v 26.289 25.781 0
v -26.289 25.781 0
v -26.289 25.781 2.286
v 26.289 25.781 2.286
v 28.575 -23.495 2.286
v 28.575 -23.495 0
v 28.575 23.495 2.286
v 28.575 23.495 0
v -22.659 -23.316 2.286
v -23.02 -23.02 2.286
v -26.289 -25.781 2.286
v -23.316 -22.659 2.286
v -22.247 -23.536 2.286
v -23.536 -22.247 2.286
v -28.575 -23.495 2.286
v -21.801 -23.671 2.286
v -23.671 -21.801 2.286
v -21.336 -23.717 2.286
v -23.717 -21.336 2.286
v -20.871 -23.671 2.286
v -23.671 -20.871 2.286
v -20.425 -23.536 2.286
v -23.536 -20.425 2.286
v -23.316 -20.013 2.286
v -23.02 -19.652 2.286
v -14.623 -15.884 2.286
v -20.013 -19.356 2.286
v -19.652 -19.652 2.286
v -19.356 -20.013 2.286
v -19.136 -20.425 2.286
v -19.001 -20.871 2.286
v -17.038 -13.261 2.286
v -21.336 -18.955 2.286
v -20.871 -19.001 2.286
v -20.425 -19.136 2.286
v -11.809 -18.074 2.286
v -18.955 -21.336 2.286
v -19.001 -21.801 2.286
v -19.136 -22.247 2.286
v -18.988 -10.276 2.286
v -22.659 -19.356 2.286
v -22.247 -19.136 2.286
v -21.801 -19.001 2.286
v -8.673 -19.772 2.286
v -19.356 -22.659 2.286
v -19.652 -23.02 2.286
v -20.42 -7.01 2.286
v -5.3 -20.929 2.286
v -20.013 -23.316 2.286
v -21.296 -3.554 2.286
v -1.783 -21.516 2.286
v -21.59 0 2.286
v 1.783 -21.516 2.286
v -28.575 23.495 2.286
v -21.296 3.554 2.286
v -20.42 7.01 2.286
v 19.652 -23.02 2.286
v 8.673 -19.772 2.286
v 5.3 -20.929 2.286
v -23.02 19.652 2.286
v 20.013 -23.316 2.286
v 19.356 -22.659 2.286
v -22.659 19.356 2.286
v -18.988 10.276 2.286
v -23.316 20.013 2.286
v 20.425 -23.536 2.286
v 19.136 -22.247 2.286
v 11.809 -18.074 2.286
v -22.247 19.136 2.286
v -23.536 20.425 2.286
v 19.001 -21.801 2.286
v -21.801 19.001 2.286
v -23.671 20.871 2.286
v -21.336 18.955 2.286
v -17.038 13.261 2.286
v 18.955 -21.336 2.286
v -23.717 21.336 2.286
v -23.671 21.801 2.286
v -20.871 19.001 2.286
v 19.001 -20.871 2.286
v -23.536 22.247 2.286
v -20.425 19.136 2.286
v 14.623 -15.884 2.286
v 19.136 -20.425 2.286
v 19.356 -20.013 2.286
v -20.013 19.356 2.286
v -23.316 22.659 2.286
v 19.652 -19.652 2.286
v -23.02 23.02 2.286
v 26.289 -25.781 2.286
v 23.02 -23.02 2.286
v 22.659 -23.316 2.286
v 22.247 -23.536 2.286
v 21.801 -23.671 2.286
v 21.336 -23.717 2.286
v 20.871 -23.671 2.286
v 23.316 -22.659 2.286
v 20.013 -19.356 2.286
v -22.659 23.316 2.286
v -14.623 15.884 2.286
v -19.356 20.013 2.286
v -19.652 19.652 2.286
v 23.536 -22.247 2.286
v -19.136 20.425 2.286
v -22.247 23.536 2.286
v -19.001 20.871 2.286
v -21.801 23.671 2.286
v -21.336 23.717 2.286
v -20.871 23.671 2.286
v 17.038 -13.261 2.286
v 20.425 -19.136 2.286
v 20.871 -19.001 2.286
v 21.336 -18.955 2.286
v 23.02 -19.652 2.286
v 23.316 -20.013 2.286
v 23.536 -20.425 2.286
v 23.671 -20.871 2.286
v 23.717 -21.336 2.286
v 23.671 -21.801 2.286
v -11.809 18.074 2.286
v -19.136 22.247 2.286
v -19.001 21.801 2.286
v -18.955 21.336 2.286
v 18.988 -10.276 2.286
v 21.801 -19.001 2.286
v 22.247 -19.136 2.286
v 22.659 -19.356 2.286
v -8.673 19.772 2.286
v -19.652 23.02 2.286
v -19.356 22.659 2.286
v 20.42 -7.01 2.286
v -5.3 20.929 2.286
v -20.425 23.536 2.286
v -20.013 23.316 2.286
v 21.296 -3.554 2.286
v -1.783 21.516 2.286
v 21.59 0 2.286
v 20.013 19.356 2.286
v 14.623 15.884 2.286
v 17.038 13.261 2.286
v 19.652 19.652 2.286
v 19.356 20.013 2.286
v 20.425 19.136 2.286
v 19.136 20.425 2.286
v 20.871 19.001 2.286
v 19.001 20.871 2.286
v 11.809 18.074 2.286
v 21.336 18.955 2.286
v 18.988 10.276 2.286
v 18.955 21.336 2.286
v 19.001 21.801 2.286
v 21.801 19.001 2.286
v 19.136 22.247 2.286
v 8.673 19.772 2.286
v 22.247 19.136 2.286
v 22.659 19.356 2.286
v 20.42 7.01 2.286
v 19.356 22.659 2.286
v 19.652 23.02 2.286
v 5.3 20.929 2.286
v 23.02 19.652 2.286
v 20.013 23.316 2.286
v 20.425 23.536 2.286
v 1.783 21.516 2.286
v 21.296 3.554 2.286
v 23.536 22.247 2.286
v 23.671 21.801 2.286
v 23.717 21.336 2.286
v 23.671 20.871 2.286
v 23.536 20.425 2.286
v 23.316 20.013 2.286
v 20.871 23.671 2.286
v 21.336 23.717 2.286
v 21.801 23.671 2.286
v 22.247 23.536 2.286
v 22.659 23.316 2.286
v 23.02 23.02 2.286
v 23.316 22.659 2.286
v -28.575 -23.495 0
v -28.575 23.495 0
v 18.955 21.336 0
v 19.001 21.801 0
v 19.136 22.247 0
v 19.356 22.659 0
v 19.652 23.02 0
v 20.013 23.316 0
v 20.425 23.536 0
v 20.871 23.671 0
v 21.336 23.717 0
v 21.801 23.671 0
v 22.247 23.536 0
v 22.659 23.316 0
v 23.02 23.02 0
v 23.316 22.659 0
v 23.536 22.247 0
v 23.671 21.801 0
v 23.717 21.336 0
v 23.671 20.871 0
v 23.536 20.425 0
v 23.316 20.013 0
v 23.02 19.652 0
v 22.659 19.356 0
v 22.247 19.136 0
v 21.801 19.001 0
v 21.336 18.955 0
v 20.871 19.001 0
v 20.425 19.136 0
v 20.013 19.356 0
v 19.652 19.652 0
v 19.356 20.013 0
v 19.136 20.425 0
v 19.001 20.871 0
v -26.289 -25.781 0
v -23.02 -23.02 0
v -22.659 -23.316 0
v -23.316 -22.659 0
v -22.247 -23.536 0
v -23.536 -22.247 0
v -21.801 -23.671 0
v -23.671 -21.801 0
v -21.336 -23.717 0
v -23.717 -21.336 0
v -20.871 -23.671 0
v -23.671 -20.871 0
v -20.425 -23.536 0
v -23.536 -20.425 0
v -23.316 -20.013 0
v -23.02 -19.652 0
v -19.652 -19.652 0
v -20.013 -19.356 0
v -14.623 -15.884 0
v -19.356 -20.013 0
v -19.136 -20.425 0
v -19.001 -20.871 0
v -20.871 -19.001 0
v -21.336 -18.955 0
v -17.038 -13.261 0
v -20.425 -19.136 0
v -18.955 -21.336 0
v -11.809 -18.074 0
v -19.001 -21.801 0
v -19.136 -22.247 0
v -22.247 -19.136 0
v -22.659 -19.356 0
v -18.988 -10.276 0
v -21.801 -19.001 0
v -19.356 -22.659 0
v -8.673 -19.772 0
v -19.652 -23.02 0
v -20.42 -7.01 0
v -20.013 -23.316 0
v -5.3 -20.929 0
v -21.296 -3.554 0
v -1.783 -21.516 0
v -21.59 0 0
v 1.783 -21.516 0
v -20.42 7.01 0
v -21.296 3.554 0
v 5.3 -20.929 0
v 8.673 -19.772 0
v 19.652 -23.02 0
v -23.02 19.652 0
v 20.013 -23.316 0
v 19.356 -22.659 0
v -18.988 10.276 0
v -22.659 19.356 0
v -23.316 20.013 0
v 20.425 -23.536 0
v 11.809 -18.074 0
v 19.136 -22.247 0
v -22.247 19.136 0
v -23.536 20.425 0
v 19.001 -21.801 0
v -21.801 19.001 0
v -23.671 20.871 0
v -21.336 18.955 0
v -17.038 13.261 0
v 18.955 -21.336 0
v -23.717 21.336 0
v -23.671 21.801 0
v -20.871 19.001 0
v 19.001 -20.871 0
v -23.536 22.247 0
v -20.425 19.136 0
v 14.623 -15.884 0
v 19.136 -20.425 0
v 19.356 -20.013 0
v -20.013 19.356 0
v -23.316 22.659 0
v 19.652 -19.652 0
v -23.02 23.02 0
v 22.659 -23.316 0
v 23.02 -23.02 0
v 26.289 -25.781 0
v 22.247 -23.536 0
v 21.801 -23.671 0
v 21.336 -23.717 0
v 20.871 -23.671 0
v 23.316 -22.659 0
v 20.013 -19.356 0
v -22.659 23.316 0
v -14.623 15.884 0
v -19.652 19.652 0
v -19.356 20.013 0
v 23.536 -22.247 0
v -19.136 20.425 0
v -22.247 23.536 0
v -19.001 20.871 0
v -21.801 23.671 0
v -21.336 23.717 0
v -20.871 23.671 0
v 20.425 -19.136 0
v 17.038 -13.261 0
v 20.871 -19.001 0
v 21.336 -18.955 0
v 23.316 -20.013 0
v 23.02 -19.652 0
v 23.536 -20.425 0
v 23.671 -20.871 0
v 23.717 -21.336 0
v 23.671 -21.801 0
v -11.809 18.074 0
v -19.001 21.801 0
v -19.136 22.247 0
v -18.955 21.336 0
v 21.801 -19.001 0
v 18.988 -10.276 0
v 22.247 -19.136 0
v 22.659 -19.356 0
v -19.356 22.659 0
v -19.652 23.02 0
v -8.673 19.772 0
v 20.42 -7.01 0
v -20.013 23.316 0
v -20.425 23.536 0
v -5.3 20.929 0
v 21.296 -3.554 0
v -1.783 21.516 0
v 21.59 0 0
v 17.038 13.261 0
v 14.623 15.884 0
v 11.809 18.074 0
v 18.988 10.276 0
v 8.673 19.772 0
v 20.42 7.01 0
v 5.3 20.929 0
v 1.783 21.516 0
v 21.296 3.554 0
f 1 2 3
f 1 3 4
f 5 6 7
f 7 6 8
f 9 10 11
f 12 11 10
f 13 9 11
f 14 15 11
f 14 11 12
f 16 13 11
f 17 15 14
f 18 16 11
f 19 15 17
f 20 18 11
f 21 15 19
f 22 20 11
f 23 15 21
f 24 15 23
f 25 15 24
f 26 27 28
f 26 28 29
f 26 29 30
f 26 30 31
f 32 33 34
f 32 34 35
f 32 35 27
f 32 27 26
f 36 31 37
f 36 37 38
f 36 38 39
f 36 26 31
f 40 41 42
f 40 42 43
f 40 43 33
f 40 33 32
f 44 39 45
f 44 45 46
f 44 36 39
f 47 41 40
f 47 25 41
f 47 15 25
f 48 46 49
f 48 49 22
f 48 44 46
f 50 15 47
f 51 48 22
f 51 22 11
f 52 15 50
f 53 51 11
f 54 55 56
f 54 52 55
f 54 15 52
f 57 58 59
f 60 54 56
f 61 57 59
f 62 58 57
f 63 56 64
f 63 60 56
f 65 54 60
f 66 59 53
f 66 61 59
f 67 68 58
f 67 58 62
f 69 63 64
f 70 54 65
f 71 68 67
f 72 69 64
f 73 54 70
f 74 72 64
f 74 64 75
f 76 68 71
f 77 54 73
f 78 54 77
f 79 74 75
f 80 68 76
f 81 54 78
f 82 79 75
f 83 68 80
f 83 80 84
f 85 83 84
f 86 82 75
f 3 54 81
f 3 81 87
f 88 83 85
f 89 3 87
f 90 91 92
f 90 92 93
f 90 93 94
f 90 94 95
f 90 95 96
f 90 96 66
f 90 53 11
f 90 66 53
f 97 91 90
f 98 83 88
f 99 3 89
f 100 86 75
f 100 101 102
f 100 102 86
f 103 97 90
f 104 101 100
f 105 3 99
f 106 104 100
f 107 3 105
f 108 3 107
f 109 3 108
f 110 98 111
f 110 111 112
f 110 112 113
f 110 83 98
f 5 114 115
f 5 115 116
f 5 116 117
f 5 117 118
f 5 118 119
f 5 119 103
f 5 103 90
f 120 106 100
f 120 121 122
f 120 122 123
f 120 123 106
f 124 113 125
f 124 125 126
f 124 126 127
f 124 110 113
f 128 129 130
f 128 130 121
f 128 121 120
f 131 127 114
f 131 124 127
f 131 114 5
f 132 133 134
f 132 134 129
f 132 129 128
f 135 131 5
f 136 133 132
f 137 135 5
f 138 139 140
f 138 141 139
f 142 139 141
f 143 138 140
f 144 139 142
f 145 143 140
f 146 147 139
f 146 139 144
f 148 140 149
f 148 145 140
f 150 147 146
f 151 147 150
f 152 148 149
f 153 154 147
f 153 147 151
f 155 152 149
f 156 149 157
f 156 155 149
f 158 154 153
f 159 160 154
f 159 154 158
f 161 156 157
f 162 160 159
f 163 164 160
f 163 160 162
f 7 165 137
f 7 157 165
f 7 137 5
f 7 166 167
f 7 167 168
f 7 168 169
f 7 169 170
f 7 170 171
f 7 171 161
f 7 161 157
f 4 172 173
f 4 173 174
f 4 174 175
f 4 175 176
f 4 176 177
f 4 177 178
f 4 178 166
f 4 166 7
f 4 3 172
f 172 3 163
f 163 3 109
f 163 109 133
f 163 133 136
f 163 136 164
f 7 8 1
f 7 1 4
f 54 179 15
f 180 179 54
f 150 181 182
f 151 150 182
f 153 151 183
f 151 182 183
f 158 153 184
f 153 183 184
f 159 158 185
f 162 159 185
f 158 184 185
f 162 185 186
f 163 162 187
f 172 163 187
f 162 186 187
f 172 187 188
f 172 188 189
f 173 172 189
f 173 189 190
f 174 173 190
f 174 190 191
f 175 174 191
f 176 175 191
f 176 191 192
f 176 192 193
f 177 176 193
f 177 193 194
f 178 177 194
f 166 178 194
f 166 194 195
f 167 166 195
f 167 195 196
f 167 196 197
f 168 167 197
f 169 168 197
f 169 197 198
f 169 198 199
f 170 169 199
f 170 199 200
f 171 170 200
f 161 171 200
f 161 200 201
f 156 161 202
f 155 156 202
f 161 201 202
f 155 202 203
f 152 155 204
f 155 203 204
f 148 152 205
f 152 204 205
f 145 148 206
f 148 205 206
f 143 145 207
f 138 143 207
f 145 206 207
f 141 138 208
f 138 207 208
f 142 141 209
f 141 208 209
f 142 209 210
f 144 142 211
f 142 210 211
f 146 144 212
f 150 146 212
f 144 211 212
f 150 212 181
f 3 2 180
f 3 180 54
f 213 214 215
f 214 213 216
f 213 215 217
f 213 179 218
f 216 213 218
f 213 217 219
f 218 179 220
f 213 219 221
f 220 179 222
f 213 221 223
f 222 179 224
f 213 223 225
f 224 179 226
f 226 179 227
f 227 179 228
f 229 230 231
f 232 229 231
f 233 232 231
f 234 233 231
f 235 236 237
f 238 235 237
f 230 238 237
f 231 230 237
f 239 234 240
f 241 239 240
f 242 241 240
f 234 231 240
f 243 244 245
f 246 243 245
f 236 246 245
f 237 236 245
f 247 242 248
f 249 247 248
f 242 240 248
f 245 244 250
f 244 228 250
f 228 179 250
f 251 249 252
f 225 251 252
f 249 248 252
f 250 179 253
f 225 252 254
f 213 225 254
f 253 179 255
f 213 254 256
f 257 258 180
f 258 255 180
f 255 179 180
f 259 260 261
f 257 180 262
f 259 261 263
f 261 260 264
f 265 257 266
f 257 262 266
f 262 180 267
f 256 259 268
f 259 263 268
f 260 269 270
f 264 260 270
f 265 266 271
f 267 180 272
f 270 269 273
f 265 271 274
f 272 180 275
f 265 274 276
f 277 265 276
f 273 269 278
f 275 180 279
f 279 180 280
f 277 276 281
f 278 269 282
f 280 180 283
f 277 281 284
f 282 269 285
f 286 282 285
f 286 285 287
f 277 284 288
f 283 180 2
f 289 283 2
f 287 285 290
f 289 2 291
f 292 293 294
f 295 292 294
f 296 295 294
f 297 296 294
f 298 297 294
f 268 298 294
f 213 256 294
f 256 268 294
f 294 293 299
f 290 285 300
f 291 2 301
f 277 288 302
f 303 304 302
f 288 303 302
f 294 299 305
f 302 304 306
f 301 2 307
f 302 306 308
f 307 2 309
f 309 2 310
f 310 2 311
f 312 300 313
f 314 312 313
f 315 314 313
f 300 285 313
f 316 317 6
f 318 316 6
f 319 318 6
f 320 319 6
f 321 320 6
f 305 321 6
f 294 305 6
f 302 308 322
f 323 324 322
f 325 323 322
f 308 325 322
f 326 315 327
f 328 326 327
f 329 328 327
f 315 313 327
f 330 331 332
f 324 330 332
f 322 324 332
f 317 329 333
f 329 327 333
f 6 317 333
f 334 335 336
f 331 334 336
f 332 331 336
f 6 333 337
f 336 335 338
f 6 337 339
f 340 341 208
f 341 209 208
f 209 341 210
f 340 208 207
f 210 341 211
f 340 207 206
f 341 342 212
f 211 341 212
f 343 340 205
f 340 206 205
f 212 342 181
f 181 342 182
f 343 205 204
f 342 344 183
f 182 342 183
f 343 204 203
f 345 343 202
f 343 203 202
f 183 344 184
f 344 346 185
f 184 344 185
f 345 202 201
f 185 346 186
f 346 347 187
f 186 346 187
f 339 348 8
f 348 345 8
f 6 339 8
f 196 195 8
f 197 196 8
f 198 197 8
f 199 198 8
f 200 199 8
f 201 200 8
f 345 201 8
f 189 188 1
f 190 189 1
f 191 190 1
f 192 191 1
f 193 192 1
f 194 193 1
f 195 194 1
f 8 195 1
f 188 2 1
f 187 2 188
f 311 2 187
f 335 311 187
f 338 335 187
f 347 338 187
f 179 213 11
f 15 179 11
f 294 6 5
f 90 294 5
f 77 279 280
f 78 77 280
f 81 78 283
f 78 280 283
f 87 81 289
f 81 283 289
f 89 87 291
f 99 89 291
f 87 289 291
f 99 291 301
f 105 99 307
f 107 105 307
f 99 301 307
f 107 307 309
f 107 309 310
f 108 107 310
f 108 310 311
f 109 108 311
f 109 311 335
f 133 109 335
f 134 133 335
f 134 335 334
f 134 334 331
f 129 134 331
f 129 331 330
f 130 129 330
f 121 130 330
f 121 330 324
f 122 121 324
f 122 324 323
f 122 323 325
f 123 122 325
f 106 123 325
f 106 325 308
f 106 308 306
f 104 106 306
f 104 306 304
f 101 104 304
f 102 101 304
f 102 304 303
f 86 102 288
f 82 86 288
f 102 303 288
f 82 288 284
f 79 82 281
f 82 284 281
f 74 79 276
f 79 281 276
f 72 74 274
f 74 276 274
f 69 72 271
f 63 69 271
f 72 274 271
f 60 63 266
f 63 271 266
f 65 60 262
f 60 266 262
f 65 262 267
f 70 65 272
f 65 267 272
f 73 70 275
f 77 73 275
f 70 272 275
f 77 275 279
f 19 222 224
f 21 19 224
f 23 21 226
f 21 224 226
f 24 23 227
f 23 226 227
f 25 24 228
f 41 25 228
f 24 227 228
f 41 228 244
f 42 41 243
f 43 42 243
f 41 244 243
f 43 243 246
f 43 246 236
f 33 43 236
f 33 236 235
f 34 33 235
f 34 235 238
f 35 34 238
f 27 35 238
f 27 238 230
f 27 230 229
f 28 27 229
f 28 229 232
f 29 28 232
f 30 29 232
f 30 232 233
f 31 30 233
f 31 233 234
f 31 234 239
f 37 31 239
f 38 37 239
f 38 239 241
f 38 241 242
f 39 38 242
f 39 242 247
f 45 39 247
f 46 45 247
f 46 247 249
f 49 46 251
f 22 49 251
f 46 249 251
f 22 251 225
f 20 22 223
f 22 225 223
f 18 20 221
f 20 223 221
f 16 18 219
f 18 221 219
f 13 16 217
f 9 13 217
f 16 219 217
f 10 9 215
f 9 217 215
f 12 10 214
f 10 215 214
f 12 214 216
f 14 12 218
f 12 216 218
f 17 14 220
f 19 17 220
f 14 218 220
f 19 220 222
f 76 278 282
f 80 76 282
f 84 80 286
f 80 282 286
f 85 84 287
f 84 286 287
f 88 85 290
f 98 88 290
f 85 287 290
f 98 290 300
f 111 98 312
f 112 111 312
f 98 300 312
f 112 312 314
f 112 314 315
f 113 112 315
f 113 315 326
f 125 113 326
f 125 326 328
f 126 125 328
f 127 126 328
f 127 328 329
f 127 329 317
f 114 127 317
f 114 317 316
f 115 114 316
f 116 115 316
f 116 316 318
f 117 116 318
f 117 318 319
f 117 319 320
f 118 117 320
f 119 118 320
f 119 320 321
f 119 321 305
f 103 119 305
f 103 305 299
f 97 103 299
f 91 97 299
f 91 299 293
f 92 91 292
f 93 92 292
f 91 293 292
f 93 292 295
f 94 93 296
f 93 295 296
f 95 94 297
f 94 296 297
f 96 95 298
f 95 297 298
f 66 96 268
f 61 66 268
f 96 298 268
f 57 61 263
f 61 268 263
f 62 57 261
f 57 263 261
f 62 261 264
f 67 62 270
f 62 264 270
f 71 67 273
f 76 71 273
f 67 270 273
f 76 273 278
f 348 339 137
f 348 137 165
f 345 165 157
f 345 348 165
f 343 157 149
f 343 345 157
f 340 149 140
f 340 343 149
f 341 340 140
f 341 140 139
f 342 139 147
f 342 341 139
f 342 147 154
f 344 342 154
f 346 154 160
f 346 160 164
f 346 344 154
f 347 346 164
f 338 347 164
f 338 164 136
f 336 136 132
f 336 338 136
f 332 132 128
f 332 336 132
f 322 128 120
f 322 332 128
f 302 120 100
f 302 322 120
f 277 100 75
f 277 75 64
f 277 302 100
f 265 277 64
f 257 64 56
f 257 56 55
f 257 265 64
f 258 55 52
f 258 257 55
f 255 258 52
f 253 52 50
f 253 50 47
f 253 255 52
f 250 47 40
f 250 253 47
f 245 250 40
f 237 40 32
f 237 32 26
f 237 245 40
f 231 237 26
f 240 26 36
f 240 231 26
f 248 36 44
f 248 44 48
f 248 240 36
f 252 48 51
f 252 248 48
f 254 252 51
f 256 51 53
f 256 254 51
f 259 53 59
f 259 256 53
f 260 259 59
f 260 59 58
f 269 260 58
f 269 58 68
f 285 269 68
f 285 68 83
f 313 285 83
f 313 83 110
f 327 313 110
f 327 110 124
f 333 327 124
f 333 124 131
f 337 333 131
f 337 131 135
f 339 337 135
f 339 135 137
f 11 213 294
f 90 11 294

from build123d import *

# Parameters (mm, degrees)
SKETCH1_W                      = 57.15
SKETCH1_H                      = 51.562
SKETCH1_R                      = 21.59
BOSS_EXTRUDE1_DEPTH            = 2.286
F_3_16_0_1875_DIAMETER_HOLE1_D = 4.7625
CHAMFER1_SIZE                  = 2.286


with BuildPart() as part:
    # Sketch1 → Boss-Extrude1 (new body)
    with BuildSketch(Plane.XY):
        Rectangle(SKETCH1_W, SKETCH1_H)
        Circle(SKETCH1_R, mode=Mode.SUBTRACT)
    extrude(amount=BOSS_EXTRUDE1_DEPTH)

    # 3/16 (0.1875) Diameter Hole1 (through all)
    with Locations(Plane.XY.offset(2.286)):
        with Locations((21.336, 21.336), (-21.336, 21.336), (-21.336, -21.336), (21.336, -21.336)):
            Hole(F_3_16_0_1875_DIAMETER_HOLE1_D / 2)

    # Chamfer1
    chamfer1_edges = [part.edges().sort_by_distance(p)[0] for p in [
        (-28.575, 25.781, 1.143),
        (28.575, 25.781, 1.143),
        (28.575, -25.781, 1.143),
        (-28.575, -25.781, 1.143),
    ]]
    chamfer(chamfer1_edges, length=CHAMFER1_SIZE)


solid = part.part
